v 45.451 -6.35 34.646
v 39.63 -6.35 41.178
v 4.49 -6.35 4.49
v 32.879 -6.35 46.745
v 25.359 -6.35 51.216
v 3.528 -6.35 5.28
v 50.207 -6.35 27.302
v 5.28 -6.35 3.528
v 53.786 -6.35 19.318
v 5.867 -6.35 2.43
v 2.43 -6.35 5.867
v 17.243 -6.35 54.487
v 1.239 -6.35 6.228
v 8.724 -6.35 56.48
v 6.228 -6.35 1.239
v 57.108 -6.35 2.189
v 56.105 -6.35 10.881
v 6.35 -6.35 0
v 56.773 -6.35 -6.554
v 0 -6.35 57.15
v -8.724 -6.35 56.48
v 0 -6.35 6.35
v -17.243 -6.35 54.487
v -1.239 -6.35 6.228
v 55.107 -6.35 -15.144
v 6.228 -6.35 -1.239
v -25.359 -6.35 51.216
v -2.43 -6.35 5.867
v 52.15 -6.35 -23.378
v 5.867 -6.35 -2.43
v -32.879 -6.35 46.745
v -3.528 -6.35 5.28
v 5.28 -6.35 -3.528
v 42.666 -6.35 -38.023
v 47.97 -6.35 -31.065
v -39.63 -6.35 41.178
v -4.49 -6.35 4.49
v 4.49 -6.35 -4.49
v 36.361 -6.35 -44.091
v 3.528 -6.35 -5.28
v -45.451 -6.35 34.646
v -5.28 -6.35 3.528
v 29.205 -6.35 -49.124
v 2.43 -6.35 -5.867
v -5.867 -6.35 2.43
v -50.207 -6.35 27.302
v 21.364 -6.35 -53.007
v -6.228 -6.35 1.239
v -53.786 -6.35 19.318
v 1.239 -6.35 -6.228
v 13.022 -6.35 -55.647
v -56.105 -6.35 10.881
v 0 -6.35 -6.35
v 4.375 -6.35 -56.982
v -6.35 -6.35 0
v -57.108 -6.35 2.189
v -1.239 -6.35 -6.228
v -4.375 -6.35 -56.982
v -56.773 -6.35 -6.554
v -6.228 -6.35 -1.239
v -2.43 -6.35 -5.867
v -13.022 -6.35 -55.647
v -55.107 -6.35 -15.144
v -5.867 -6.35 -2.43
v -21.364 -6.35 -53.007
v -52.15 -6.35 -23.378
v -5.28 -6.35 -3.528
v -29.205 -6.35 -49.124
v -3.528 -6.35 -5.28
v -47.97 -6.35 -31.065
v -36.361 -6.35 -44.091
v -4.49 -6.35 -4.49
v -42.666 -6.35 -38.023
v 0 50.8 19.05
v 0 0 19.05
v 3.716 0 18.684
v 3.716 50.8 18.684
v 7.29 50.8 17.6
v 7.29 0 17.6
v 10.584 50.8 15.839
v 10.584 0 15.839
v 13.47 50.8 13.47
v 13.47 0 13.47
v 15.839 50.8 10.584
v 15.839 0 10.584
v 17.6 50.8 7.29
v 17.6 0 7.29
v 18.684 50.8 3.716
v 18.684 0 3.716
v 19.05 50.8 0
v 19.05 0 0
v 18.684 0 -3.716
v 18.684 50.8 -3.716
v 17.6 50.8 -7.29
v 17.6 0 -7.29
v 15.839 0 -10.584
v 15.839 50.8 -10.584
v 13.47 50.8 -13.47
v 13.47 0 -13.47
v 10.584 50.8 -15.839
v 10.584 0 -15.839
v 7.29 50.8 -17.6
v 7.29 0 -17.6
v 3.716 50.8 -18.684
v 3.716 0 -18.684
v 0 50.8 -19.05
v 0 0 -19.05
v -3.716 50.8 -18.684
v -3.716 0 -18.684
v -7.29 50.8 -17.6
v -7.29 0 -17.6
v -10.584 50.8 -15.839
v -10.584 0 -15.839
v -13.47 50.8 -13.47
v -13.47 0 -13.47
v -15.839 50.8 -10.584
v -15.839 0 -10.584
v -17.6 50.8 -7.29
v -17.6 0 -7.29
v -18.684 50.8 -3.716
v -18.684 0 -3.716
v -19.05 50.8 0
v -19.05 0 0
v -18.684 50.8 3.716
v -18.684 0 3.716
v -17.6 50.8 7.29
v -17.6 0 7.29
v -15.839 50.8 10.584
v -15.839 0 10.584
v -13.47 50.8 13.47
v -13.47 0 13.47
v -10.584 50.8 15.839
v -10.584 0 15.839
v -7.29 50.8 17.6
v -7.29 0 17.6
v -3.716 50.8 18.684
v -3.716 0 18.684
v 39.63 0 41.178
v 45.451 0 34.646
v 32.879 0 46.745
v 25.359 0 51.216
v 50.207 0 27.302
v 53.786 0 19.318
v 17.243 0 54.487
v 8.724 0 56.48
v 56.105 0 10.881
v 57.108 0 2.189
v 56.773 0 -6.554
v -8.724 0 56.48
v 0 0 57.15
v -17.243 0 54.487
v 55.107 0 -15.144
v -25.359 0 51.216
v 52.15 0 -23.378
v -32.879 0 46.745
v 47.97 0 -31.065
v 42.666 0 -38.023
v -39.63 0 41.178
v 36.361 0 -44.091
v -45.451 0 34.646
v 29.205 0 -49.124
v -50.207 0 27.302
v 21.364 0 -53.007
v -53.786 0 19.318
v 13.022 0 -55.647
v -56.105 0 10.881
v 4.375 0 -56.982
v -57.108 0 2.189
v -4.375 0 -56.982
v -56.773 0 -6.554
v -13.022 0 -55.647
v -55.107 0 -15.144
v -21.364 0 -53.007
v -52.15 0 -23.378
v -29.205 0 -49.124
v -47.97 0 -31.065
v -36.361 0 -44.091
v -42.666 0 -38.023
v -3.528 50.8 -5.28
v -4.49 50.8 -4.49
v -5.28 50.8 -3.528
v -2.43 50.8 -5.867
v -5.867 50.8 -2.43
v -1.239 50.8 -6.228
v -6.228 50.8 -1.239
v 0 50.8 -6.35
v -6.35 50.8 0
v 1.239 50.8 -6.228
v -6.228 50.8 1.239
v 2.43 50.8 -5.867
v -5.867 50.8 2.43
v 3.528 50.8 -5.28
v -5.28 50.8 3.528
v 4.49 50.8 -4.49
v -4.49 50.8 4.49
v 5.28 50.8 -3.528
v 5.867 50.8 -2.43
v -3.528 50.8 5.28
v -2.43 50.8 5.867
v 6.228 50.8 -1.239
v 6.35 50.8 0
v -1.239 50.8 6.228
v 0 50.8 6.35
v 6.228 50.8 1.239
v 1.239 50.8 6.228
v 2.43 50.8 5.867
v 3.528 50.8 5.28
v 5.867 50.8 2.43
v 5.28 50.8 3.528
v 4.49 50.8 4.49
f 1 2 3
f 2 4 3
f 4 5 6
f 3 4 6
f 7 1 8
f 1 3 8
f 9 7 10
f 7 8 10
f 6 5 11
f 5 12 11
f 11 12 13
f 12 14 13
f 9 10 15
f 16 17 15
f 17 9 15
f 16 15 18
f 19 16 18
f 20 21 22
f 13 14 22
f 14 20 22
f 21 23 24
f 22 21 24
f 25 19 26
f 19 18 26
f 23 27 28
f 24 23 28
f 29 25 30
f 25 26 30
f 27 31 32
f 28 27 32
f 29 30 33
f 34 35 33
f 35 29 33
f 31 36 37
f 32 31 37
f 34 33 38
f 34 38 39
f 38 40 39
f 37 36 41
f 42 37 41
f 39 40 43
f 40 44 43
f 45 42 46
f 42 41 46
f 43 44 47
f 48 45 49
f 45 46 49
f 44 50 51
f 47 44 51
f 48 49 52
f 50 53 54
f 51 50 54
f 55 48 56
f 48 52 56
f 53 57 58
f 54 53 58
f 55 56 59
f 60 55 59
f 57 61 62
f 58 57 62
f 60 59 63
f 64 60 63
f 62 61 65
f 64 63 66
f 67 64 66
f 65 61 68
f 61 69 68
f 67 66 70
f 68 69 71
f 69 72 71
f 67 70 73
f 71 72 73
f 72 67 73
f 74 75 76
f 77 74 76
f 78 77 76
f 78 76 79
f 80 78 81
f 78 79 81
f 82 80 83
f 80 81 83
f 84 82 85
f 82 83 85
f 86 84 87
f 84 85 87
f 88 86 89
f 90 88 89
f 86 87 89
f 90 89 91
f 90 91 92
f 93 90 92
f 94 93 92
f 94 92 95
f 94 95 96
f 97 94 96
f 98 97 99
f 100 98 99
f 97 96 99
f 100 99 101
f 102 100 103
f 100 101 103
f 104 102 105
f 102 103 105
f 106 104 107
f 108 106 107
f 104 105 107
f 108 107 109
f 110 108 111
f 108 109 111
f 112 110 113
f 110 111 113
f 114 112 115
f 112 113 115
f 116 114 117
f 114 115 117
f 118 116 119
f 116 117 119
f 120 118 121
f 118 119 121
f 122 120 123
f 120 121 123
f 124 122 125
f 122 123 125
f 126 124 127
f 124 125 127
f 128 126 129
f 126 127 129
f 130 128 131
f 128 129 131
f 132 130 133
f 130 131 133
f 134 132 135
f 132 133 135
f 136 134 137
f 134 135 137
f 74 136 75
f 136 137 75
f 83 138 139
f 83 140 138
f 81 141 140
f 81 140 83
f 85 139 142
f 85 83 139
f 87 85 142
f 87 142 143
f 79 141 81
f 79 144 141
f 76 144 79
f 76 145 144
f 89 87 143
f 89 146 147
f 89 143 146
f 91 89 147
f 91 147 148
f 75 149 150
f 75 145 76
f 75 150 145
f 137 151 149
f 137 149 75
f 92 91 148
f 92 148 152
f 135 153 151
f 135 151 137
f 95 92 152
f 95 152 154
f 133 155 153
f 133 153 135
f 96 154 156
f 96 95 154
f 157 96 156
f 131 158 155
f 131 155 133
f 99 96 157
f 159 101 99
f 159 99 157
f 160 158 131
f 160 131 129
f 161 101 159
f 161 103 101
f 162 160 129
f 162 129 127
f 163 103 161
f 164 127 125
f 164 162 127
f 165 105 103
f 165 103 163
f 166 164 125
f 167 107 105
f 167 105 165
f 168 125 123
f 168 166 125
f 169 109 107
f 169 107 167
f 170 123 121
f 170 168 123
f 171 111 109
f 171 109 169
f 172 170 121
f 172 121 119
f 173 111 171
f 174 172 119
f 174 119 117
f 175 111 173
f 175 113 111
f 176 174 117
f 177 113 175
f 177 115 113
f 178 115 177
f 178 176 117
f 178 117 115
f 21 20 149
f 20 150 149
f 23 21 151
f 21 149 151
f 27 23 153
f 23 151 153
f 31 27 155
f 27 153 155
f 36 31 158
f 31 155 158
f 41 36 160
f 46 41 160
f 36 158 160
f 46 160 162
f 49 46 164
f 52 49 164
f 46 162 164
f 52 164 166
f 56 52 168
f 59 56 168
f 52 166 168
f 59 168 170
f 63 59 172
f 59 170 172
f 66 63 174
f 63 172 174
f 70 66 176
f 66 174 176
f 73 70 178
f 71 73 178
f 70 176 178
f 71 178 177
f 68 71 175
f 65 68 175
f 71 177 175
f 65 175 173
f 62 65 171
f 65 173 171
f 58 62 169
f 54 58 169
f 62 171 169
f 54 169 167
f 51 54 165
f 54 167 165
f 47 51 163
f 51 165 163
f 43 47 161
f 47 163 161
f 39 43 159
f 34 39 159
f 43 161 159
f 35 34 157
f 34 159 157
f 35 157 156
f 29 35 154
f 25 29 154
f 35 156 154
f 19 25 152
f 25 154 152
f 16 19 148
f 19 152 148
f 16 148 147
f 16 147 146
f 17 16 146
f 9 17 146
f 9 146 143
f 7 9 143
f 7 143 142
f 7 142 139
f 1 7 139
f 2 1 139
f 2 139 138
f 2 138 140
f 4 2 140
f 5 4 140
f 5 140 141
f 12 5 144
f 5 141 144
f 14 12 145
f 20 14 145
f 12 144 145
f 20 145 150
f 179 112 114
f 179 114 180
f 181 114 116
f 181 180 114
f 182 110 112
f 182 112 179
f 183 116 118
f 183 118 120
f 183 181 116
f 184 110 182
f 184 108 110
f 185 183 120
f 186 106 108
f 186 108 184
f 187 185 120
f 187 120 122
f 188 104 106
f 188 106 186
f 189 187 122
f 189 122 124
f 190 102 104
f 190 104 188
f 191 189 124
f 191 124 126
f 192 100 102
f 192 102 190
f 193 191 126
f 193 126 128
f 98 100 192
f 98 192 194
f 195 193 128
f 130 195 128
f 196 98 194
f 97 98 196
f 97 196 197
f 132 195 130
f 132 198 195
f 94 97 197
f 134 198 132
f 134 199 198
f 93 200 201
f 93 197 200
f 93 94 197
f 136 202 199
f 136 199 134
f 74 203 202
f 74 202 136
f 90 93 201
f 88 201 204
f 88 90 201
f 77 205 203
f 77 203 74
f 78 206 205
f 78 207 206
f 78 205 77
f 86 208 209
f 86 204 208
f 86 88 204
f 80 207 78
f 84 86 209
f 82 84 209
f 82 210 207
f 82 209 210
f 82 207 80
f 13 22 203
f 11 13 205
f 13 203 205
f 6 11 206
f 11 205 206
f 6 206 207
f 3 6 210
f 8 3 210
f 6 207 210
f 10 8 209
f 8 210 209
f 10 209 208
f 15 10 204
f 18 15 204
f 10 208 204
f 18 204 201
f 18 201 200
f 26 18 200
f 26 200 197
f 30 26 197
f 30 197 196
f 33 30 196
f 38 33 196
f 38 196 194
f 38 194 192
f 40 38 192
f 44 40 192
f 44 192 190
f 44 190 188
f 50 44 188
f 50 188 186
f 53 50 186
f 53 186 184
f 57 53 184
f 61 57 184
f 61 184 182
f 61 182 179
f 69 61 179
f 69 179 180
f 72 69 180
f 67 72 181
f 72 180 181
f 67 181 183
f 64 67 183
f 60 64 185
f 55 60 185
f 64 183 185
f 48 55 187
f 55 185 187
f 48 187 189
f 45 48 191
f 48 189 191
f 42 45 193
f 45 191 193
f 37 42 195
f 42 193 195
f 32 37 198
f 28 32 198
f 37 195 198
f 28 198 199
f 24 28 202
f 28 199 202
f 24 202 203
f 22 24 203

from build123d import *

# Parameters (mm, degrees)
SKETCH2_W           = 57.15
SKETCH2_H           = 6.35
SKETCH3_R           = 19.05
BOSS_EXTRUDE1_DEPTH = 50.8
SKETCH4_R           = 6.35
CUT_EXTRUDE1_DEPTH  = 81.026


with BuildPart() as part:
    # Sketch2 → Revolve1 (revolve)
    with BuildSketch(Plane.XY, mode=Mode.PRIVATE) as revolve1_sk:
        with Locations((28.575, -3.175)):
            Rectangle(SKETCH2_W, SKETCH2_H)
    revolve(revolve1_sk.sketch.rotate(Axis((0, 0, 0), (0, -1, 0)), 90), axis=Axis((0, 0, 0), (0, -1, 0)))

    # Sketch3 → Boss-Extrude1 (add)
    with BuildSketch(Plane(origin=(0, 0, 0), x_dir=(1, 0, 0), z_dir=(0, 1, 0))):
        with Locations(Location((0, 0, 0), (0, 0, 270))):
            Circle(SKETCH3_R)
    extrude(amount=BOSS_EXTRUDE1_DEPTH)

    # Sketch4 → Cut-Extrude1 (cut)
    with BuildSketch(Plane(origin=(0, 50.8, 0), x_dir=(1, 0, 0), z_dir=(0, 1, 0))):
        with Locations(Location((0, 0, 0), (0, 0, 270))):
            Circle(SKETCH4_R)
    extrude(amount=-CUT_EXTRUDE1_DEPTH, mode=Mode.SUBTRACT)


solid = part.part
